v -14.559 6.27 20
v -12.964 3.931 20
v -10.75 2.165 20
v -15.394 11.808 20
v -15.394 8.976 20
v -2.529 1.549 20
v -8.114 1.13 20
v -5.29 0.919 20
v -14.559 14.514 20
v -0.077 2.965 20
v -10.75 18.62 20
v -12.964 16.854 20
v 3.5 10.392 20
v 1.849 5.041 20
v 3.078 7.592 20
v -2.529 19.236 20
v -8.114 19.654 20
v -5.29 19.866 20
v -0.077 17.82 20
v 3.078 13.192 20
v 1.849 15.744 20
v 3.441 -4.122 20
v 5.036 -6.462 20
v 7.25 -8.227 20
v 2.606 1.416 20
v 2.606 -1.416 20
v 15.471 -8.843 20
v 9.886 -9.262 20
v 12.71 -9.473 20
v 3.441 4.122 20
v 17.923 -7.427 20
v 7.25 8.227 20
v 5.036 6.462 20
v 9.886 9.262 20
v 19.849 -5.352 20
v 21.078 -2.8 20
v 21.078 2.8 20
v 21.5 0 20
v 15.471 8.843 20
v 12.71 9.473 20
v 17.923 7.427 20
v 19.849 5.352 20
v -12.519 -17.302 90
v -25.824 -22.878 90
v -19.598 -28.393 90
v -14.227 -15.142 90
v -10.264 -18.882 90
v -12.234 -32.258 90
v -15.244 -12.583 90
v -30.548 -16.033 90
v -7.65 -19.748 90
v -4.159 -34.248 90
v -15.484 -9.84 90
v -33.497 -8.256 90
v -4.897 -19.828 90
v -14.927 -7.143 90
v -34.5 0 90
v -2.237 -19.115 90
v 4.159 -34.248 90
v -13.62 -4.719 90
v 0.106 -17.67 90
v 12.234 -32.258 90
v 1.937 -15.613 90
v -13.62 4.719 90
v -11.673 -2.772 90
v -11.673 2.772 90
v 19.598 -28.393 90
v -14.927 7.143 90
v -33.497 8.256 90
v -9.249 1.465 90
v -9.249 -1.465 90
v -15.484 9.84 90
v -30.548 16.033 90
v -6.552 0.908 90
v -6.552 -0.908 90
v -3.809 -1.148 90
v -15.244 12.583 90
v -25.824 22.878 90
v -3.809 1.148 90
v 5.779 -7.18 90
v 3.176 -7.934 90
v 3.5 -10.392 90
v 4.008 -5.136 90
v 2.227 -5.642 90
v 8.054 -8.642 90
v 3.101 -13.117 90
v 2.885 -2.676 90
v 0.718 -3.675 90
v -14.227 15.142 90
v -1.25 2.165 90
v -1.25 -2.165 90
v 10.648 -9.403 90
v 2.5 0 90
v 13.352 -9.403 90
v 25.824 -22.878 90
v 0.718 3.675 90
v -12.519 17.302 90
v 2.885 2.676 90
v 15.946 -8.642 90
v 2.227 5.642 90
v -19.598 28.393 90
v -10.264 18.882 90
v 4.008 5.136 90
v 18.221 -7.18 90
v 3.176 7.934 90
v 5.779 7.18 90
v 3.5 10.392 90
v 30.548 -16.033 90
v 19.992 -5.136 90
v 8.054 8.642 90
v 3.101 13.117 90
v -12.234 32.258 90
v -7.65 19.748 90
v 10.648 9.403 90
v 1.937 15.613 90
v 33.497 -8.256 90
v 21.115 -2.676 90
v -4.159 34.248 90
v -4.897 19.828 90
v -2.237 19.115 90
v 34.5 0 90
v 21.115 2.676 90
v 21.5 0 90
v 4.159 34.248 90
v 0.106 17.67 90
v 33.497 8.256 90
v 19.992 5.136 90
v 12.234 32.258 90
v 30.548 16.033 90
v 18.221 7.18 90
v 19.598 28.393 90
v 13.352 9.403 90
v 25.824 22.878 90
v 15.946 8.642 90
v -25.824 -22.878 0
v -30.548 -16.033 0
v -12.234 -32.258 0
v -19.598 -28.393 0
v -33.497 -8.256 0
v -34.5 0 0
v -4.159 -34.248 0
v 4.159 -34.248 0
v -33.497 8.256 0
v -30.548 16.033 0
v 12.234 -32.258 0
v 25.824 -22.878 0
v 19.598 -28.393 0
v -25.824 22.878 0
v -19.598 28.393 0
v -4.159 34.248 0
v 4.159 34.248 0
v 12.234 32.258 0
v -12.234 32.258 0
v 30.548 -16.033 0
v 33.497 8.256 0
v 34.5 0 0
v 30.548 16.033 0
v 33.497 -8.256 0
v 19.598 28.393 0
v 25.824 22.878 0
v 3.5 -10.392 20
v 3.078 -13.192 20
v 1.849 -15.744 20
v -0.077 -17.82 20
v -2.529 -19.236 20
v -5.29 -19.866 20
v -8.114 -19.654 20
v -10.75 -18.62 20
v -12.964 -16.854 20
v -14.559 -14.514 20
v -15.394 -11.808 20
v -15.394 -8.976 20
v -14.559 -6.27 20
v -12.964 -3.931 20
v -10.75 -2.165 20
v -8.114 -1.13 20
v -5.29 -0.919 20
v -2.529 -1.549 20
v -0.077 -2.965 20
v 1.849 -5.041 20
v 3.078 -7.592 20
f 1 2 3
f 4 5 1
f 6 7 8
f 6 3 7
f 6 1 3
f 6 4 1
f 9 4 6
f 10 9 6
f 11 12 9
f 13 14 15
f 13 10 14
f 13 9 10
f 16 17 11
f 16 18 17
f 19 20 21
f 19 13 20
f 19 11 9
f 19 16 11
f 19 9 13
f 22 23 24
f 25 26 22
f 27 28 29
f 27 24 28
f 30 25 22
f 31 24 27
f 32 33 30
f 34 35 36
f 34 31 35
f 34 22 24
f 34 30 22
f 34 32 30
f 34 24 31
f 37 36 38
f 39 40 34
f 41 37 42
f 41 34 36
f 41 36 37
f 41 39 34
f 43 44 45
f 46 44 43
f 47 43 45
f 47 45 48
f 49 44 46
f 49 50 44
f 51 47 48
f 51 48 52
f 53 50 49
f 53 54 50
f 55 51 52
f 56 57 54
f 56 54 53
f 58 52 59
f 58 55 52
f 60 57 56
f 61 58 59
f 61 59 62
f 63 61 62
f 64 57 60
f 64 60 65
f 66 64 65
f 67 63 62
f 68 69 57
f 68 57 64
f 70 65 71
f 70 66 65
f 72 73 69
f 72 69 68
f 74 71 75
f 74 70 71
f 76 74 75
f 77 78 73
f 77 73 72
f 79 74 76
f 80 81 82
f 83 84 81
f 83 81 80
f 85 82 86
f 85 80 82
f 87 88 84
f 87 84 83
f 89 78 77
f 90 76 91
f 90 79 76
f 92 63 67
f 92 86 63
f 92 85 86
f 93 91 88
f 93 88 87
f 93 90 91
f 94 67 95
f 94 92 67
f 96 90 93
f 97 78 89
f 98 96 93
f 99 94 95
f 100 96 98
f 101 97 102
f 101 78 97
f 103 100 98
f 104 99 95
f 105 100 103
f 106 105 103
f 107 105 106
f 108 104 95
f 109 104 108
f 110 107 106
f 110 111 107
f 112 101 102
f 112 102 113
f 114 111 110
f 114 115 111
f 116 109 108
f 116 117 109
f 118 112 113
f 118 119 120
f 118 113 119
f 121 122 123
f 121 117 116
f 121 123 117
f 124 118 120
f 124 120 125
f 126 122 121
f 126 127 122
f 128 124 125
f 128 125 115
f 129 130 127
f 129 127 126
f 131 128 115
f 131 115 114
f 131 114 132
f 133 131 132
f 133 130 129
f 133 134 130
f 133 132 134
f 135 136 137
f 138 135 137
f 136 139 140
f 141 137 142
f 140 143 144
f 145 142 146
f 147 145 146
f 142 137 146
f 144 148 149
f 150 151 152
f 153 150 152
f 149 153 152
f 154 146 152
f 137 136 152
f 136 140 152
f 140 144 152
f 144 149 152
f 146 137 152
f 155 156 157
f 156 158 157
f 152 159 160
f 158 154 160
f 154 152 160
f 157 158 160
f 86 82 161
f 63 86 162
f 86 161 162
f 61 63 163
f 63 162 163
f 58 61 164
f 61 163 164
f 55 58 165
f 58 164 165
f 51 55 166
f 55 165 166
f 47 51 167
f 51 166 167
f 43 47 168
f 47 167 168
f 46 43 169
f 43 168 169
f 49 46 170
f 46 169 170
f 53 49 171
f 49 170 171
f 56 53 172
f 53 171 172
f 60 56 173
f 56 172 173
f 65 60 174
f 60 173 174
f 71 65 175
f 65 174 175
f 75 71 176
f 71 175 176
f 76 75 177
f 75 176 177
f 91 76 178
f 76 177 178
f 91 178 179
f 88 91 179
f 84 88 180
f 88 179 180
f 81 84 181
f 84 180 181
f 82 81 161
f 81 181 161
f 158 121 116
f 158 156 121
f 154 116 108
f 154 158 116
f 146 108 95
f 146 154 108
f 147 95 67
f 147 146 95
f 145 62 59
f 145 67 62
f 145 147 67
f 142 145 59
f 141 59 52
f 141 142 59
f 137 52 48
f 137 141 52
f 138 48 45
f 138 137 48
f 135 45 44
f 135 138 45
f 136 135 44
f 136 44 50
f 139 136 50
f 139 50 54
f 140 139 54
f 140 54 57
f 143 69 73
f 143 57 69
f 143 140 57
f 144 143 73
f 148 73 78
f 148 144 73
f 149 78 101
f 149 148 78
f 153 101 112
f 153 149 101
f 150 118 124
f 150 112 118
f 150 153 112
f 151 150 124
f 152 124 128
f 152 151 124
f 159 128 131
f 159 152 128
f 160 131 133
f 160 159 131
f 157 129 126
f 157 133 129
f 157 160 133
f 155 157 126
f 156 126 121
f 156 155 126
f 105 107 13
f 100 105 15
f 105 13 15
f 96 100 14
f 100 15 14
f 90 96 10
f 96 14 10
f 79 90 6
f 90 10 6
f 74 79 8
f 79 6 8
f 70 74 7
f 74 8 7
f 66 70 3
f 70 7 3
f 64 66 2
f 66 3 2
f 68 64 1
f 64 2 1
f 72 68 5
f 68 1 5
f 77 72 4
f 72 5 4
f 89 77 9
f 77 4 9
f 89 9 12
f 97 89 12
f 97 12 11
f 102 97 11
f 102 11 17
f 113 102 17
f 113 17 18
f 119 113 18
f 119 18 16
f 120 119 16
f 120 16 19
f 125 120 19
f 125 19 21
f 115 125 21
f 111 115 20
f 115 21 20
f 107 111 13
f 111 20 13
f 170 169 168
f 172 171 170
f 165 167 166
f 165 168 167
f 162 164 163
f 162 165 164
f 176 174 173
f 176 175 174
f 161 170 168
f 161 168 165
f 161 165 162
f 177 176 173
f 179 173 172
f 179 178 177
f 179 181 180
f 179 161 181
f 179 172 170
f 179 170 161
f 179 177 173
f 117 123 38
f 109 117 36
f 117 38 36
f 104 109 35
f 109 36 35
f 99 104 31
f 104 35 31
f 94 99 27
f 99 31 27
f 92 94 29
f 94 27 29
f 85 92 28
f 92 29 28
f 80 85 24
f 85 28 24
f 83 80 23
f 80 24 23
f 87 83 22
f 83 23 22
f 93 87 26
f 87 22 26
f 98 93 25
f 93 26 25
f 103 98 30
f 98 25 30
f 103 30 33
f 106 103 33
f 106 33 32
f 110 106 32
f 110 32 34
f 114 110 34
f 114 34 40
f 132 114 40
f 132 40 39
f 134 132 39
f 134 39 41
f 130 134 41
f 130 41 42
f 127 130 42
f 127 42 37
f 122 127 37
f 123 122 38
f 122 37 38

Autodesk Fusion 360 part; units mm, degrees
sketch "Sketch1" plane through (0, 0, 0) normal (0, 0, 1) x (1, 0, 0)
  circle A0 centre (0, 0) radius 34.5
  line L0 (0, 0) -> (12, 0)
  line L1 (0, 0) -> (-6, 10.3923)
  line L2 (0, 0) -> (12, 0) construction
  line L3 (0, 0) -> (-6, -10.3923)
  line L4 (0, 0) -> (12, 0) construction
  circle A1 centre (-6, 10.3923) radius 9.5
  circle A2 centre (12, 0) radius 9.5
  circle A3 centre (-6, -10.3923) radius 9.5
  dimension "d1" = 69
  dimension "d2" = 12
  dimension "d3" = 12
  dimension "d4" = 120
  dimension "d5" = 120
  dimension "d6" = 12
  dimension "d7" = 19
  dimension "d8" = 19
  dimension "d9" = 19
extrude "Extrude1" add sketch "Sketch1" along normal blind 100
extrude "Extrude2" add sketch "Sketch1" along normal blind 20 contours A2 | A1 | A3
extrude "Extrude3" cut 1 faces at (10.3664, -17.9552, 100) along direction (0, 0, -1) blind 30
extrude "Extrude4" add 1 faces at (10.3664, -17.9552, 70) along direction (0, 0, 1) blind 20
